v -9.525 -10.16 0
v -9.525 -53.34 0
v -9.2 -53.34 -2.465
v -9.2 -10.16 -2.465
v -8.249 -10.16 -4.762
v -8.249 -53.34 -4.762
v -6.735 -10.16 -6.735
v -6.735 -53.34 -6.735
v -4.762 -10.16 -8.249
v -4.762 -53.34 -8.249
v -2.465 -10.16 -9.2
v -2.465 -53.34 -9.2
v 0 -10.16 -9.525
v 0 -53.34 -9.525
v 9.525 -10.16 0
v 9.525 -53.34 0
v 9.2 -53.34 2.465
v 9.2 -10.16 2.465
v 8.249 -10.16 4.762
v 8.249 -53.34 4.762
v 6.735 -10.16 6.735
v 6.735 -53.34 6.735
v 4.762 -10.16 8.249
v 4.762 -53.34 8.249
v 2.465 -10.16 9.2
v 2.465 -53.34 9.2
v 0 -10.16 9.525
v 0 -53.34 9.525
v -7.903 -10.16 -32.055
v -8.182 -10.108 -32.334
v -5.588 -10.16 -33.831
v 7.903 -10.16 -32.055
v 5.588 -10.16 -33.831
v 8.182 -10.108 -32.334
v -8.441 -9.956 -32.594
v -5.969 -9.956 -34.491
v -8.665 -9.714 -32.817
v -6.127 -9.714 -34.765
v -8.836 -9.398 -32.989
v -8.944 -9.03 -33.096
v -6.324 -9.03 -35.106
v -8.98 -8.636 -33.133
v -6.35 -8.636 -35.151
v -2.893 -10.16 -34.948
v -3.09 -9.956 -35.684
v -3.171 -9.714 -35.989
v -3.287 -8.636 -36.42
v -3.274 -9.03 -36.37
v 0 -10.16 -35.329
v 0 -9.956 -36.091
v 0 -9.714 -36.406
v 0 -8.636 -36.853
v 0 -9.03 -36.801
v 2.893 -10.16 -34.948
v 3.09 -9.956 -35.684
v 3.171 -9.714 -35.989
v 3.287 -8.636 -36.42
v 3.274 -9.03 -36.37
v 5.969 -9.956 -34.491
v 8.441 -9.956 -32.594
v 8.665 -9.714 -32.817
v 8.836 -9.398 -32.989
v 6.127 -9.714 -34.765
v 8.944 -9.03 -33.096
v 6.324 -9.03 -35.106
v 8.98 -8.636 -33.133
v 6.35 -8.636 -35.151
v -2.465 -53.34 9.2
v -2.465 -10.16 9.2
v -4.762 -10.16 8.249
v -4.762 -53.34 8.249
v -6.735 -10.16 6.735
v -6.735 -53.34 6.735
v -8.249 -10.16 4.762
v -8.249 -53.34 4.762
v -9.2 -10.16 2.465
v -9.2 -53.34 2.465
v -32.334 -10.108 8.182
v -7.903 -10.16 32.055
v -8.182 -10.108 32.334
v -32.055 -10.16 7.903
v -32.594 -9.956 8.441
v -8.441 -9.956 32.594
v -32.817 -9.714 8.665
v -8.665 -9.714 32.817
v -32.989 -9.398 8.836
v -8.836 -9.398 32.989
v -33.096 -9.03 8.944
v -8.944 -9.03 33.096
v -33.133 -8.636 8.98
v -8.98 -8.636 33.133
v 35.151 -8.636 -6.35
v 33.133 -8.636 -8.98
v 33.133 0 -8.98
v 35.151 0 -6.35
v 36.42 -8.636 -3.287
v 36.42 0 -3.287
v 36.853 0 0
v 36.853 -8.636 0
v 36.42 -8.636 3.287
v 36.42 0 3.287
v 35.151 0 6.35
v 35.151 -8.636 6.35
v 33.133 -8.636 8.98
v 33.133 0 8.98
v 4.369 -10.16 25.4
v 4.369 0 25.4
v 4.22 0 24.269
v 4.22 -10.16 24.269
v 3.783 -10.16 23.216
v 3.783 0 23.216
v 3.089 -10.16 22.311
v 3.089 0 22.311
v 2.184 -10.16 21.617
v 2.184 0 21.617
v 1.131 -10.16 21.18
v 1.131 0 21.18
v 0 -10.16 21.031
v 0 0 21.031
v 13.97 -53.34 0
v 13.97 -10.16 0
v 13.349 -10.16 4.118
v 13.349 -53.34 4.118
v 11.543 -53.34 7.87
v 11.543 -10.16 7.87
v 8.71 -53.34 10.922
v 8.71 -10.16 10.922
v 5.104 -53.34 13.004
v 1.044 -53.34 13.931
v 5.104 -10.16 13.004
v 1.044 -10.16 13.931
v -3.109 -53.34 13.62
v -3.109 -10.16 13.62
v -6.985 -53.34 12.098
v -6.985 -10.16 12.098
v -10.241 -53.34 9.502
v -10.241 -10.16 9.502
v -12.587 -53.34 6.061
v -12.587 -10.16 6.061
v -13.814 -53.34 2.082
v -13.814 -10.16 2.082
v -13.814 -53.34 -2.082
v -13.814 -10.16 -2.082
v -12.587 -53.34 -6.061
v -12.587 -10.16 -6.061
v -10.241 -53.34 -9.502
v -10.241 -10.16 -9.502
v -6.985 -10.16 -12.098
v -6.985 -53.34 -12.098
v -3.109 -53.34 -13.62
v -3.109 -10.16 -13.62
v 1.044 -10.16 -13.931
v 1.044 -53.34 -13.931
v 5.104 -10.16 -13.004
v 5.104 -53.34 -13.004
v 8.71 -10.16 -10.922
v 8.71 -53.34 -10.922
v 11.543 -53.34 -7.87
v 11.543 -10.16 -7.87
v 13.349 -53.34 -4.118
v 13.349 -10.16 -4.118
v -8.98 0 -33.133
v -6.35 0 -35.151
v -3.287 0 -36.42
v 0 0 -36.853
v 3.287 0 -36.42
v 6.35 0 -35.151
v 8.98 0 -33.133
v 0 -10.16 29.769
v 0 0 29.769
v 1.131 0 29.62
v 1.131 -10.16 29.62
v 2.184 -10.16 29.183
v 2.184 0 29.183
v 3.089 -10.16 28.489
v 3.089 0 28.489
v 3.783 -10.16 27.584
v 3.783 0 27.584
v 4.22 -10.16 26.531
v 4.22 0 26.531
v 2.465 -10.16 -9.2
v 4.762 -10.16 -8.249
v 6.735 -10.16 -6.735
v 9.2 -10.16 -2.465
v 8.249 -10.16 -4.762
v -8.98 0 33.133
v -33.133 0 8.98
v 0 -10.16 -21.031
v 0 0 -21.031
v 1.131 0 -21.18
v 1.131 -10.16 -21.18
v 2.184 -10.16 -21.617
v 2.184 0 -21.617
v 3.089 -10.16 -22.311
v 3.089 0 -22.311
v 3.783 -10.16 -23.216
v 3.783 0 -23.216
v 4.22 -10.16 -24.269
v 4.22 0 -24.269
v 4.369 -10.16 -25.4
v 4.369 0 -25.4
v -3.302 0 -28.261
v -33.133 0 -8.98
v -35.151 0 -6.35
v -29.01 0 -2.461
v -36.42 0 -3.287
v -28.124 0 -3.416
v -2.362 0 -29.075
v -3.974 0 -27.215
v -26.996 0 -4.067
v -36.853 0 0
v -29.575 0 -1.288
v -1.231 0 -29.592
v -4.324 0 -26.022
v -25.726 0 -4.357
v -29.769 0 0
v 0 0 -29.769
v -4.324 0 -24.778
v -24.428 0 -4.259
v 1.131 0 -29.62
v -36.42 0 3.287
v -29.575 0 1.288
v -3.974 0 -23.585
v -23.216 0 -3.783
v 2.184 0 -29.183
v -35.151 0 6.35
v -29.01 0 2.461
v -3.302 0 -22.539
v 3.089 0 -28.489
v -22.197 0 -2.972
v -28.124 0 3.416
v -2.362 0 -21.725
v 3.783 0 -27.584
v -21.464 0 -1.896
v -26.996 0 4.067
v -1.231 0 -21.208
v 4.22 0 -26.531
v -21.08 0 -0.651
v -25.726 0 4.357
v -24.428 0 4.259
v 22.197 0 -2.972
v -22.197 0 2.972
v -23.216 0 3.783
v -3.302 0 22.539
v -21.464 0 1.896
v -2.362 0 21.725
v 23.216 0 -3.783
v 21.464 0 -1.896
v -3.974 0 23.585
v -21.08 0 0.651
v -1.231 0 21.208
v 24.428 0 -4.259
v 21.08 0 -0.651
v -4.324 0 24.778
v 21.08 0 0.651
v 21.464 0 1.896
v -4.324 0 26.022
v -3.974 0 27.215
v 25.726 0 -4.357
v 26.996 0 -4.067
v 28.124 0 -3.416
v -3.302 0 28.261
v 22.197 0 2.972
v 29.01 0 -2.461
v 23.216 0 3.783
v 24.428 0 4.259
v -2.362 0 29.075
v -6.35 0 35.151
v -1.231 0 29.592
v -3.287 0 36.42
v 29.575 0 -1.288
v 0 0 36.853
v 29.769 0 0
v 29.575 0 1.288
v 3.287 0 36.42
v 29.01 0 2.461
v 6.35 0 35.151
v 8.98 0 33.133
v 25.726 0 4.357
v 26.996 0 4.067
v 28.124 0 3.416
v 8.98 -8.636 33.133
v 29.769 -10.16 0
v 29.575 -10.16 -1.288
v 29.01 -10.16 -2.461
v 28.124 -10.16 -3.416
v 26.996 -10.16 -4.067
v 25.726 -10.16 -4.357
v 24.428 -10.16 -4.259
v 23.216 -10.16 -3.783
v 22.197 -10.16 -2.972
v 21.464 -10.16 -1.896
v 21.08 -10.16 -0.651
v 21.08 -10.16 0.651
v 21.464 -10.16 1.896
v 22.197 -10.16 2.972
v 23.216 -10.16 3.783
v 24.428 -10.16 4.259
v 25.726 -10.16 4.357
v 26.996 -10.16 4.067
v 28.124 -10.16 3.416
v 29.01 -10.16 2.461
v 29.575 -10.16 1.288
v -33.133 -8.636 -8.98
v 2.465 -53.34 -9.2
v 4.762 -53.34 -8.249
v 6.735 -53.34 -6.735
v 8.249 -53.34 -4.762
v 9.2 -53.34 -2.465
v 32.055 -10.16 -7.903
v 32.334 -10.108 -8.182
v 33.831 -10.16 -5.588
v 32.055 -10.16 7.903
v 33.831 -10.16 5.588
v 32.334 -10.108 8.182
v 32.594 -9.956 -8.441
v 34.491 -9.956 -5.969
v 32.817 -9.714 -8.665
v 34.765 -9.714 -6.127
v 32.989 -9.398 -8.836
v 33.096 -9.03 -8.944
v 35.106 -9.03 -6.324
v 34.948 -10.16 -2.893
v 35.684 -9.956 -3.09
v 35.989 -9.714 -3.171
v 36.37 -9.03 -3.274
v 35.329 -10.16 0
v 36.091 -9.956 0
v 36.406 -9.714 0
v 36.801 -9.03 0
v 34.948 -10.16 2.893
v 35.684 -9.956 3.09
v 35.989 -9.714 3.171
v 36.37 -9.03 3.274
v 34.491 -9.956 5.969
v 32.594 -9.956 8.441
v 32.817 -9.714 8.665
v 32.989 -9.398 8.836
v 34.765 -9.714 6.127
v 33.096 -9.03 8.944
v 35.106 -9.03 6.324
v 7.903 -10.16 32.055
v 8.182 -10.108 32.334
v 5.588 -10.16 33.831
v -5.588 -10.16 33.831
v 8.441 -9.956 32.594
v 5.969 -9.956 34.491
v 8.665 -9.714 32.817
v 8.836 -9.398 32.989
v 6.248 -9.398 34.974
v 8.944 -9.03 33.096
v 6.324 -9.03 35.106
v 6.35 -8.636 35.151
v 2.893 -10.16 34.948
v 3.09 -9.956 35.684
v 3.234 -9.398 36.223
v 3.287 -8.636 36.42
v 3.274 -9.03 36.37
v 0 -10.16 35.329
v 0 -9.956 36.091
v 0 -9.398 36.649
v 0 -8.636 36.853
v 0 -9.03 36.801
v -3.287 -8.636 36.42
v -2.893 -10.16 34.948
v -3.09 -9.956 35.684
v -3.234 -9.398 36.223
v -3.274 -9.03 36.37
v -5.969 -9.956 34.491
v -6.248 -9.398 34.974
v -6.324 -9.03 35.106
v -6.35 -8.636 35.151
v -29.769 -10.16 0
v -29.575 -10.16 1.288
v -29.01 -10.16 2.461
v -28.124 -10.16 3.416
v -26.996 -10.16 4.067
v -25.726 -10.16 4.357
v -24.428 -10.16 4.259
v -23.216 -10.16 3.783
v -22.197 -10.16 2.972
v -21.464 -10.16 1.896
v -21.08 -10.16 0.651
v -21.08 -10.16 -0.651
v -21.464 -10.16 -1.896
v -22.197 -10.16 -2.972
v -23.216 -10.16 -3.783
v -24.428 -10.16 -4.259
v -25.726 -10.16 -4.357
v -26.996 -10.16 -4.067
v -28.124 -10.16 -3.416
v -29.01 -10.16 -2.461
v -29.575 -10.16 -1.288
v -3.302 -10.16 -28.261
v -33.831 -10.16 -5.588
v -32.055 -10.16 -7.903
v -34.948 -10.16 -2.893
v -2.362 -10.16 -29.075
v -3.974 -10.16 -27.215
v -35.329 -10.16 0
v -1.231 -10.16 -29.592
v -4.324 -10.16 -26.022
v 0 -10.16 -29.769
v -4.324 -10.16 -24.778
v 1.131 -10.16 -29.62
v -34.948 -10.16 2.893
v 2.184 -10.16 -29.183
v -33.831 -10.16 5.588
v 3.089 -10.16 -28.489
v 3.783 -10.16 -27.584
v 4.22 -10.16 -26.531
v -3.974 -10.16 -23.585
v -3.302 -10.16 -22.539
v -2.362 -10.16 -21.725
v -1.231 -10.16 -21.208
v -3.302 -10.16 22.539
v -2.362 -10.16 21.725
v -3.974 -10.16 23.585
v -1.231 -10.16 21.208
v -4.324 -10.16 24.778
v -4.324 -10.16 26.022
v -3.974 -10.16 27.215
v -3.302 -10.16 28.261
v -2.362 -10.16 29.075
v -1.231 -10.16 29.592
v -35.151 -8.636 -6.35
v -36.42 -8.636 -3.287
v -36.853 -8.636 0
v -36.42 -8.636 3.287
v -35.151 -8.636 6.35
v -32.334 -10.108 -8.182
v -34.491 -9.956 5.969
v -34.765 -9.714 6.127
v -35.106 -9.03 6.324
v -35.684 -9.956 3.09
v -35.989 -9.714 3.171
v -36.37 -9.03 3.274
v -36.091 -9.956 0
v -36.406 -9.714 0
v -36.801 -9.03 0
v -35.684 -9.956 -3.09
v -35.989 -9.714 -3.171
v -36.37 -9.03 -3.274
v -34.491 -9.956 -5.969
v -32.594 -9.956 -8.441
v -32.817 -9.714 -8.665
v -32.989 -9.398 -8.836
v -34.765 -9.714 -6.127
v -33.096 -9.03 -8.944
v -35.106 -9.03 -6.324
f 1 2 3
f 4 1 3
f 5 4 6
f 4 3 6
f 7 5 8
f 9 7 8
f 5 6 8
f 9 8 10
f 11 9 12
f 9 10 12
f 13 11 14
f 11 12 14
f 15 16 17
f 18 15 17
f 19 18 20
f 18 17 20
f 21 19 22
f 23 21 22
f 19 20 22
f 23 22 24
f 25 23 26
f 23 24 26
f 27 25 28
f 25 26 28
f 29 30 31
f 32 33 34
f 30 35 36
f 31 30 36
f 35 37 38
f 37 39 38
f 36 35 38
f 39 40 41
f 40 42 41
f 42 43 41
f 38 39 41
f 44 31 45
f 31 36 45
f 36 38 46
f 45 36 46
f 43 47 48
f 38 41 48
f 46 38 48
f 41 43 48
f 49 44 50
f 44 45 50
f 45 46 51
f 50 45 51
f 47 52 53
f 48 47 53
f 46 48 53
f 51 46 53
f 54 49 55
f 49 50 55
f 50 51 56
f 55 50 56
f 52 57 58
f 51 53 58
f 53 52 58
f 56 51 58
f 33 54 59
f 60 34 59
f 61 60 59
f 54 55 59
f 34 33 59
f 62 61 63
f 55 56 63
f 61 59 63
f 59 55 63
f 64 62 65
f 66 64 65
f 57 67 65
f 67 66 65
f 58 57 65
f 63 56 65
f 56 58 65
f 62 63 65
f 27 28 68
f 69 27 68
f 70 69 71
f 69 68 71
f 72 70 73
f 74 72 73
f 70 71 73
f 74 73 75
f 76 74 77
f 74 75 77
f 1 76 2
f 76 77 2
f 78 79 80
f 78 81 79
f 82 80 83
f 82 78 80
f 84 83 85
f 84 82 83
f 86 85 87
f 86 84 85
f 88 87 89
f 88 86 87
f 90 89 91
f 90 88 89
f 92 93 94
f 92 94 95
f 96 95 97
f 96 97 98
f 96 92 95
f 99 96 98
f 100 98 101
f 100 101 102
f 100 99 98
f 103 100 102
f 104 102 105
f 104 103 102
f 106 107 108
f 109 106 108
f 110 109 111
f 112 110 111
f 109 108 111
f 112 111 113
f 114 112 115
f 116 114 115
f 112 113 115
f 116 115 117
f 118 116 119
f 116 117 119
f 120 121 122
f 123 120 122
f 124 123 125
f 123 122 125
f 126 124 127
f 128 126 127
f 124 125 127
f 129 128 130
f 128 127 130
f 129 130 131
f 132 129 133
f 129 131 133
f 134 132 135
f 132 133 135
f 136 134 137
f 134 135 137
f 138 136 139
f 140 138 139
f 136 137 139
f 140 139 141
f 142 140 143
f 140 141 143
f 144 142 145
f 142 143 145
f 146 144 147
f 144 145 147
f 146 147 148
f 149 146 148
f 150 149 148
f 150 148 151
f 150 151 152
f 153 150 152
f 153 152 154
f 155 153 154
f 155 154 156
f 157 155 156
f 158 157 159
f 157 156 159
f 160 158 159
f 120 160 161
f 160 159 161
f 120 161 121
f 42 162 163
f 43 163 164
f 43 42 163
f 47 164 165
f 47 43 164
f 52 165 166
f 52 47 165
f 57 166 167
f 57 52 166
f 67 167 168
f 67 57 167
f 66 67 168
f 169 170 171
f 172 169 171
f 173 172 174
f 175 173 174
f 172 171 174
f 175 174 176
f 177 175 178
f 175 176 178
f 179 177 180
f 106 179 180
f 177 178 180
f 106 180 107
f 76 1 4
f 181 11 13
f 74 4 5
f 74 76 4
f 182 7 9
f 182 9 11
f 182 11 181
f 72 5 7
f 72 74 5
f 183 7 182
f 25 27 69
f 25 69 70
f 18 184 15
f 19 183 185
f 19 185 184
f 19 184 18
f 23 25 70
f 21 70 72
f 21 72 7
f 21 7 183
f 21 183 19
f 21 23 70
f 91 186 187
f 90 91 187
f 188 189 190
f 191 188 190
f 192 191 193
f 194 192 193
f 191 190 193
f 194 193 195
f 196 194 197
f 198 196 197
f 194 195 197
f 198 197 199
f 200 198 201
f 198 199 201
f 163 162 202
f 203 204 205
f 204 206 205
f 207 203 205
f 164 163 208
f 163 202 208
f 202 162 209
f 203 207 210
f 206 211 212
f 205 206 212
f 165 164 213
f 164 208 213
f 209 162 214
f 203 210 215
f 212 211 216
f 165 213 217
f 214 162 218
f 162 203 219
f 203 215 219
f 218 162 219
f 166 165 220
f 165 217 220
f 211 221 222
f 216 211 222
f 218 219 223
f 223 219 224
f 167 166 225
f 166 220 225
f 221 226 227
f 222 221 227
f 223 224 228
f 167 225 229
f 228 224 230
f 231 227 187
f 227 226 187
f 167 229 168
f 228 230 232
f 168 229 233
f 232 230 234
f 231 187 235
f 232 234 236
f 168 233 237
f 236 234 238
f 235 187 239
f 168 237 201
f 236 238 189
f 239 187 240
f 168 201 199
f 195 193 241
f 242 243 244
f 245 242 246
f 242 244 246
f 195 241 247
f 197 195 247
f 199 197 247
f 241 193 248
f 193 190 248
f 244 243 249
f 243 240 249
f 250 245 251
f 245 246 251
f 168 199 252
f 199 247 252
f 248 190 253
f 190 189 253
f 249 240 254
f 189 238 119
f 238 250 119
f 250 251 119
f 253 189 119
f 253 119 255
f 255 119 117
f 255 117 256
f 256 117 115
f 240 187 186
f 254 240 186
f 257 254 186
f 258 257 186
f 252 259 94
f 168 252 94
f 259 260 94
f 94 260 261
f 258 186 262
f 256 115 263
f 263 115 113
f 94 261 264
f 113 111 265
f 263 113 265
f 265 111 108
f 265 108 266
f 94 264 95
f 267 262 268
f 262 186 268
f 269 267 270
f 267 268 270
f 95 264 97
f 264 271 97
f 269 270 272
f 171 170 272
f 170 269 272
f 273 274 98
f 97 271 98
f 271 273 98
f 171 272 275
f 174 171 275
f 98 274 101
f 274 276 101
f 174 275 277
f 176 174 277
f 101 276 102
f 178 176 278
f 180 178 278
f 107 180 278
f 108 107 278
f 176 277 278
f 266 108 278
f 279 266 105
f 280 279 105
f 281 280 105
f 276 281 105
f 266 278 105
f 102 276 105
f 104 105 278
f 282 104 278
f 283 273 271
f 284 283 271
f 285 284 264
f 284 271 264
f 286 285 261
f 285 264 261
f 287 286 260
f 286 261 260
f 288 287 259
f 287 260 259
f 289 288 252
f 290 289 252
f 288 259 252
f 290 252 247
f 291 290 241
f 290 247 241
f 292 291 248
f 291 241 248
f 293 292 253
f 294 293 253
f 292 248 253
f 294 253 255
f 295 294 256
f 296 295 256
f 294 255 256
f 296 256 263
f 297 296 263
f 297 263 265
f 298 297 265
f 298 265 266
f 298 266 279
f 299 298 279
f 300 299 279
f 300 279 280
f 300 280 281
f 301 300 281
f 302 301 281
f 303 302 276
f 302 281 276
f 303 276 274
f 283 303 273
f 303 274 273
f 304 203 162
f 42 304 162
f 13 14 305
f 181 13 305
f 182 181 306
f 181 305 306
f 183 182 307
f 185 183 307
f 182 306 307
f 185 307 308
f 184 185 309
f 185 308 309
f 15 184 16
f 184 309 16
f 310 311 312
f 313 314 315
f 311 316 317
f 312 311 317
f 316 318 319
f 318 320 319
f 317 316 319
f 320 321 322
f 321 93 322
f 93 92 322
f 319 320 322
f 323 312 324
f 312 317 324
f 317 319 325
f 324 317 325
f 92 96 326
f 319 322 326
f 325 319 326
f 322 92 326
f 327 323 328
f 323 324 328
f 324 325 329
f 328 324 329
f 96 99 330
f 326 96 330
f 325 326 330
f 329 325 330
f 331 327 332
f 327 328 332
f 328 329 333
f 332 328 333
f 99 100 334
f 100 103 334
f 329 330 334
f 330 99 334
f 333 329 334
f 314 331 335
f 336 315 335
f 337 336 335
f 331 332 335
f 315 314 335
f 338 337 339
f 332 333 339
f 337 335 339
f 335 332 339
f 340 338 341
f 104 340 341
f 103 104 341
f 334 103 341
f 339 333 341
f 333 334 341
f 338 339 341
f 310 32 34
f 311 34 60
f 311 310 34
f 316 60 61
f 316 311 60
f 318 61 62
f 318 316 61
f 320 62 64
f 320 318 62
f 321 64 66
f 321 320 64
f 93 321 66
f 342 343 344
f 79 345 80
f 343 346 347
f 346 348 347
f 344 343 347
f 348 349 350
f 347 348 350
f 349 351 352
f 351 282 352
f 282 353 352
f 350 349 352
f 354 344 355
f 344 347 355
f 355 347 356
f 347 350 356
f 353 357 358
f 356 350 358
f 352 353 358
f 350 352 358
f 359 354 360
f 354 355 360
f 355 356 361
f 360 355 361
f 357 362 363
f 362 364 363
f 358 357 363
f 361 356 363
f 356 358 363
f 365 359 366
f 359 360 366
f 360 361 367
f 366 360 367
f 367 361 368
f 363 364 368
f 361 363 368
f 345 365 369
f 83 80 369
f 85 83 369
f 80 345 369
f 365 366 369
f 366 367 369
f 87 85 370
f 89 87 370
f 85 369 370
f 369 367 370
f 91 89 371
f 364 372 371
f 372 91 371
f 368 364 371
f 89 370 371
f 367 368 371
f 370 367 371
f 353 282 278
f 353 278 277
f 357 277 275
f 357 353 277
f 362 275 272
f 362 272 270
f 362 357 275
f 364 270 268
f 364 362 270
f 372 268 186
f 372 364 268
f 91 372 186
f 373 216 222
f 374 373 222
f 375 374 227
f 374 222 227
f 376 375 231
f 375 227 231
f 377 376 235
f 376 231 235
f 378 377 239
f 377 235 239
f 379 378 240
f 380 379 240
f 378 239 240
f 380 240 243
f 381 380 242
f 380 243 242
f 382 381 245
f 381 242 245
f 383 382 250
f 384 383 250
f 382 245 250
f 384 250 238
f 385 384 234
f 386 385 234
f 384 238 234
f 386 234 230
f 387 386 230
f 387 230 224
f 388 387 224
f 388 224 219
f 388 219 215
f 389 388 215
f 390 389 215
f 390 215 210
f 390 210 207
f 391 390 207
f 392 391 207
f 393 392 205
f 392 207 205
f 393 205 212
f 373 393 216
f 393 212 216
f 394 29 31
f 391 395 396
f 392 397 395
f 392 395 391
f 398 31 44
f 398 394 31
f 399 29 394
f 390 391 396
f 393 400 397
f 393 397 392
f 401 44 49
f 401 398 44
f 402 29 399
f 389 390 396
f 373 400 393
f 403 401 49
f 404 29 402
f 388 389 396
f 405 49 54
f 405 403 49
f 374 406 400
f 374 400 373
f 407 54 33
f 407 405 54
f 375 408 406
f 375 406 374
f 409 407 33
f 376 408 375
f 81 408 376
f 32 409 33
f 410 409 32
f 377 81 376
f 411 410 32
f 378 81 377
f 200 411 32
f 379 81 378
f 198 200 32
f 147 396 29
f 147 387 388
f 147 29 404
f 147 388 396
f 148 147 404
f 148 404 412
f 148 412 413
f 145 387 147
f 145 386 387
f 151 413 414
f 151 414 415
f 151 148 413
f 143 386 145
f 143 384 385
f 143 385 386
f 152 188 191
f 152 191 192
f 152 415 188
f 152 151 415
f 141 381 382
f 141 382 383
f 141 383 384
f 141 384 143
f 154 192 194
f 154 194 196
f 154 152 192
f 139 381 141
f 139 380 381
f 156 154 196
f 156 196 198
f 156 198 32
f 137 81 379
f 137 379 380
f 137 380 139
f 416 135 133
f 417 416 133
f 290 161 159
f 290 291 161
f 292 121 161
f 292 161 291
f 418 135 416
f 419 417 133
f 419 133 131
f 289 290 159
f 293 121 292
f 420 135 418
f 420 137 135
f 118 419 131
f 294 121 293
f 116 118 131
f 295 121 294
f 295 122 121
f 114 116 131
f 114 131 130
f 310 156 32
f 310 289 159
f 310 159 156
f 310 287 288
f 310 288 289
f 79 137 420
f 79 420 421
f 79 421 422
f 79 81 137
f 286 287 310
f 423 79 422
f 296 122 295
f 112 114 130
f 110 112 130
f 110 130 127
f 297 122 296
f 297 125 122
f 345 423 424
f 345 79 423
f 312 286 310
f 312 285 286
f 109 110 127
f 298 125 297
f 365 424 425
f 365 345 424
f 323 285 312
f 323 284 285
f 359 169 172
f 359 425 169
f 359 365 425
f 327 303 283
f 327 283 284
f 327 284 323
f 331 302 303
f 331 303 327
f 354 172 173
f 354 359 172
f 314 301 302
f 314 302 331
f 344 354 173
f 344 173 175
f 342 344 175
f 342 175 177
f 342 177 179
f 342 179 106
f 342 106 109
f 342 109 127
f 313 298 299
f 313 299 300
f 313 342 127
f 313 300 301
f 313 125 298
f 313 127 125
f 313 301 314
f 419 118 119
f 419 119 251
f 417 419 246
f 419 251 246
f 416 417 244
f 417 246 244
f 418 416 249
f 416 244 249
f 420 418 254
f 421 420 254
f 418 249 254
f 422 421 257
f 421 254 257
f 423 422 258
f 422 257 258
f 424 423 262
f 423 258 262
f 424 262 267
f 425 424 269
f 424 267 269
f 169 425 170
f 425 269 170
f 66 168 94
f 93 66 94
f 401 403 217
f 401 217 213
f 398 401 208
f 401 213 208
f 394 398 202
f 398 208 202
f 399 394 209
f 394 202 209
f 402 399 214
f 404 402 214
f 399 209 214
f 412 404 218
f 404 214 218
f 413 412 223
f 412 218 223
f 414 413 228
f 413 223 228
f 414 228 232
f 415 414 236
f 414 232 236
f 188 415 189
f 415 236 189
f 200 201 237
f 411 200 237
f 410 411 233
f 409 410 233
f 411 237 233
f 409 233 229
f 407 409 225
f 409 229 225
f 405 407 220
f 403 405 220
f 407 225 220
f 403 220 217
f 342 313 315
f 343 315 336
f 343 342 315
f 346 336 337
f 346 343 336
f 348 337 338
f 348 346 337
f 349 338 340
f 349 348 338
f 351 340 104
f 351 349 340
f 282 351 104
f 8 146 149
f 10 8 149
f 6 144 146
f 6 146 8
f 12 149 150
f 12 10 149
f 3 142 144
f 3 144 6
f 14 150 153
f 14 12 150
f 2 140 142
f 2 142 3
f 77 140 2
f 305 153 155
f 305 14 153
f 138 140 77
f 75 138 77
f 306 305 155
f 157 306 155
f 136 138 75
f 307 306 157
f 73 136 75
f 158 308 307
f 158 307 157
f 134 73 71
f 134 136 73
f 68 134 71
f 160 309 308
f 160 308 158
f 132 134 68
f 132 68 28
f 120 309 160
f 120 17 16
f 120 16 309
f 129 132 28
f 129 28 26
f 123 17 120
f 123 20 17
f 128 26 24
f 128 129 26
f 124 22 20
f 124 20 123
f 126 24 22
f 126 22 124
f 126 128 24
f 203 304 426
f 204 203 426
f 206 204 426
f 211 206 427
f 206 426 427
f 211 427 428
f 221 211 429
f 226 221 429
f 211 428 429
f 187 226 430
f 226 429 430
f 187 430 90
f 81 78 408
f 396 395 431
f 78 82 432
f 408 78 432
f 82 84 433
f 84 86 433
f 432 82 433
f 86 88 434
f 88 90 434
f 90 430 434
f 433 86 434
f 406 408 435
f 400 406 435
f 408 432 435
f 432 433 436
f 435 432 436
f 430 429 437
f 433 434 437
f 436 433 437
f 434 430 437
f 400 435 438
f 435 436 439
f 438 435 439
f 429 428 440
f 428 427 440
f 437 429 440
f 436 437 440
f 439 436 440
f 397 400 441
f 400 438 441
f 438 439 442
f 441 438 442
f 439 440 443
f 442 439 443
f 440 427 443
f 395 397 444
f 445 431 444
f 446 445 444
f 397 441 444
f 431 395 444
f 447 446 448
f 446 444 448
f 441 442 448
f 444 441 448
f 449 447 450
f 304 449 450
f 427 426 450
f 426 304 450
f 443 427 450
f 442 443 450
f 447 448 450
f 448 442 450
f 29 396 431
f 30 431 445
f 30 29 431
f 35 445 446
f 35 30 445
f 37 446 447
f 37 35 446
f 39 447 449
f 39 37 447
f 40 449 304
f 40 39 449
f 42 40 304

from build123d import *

# Parameters (mm, degrees)
F1_DEPTH = 10.16
F2_R     = 12.7
F3_R     = 12.7
F4_R     = 1.524
F5_R     = 13.97
F6_DEPTH = 43.18
F8_DEPTH = 43.18


with BuildPart() as f1:
    # F0 (on Front) → F1 (new body)
    with BuildSketch(Plane.XZ):
        with BuildLine():
            Line((0, 21.0312), (0, 0))
            Line((0, 0), (21.0312, 0))
            ThreePointArc((21.0312, 0), (25.4, 4.3688), (29.7688, 0))
            Line((29.7688, 0), (42.1132, 0))
            Line((42.1132, 0), (0, 42.1132))
            Line((0, 42.1132), (0, 29.7688))
            ThreePointArc((0, 29.7688), (3.0892081056, 28.4892081056), (4.3688, 25.4))
            ThreePointArc((4.3688, 25.4), (3.0892081056, 22.3107918944), (0, 21.0312))
        make_face()
        with BuildLine():
            Line((21.0312, 0), (0, 0))
            Line((0, 0), (0, -21.0312))
            ThreePointArc((0, -21.0312), (3.0892081056, -22.3107918944), (4.3688, -25.4))
            ThreePointArc((4.3688, -25.4), (3.0892081056, -28.4892081056), (0, -29.7688))
            Line((0, -29.7688), (0, -42.1132))
            Line((0, -42.1132), (42.1132, 0))
            Line((42.1132, 0), (29.7688, 0))
            ThreePointArc((29.7688, 0), (25.4, -4.3688), (21.0312, 0))
        make_face()
        with BuildLine():
            Line((0, -21.0312), (0, 0))
            Line((0, 0), (-21.0312, 0))
            ThreePointArc((-21.0312, 0), (-25.4, -4.3688), (-29.7688, 0))
            Line((-29.7688, 0), (-42.1132, 0))
            Line((-42.1132, 0), (0, -42.1132))
            Line((0, -42.1132), (0, -29.7688))
            ThreePointArc((0, -29.7688), (-4.3688, -25.4), (0, -21.0312))
        make_face()
        with BuildLine():
            Line((-21.0312, 0), (0, 0))
            Line((0, 0), (0, 21.0312))
            ThreePointArc((0, 21.0312), (-4.3688, 25.4), (0, 29.7688))
            Line((0, 29.7688), (0, 42.1132))
            Line((0, 42.1132), (-42.1132, 0))
            Line((-42.1132, 0), (-29.7688, 0))
            ThreePointArc((-29.7688, 0), (-25.4, 4.3688), (-21.0312, 0))
        make_face()
    extrude(amount=F1_DEPTH)

    # F2
    f2_edges = [f1.edges().sort_by_distance(p)[0] for p in [
        (0, -5.08, 42.1132),
        (-42.1132, -5.08, 0),
    ]]
    fillet(f2_edges, radius=F2_R)

    # F3
    f3_edges = [f1.edges().sort_by_distance(p)[0] for p in [
        (42.1132, -5.08, 0),
        (0, -5.08, -42.1132),
    ]]
    fillet(f3_edges, radius=F3_R)

    # F4
    f4_edges = [f1.edges().sort_by_distance(p)[0] for p in [
        (-21.0566, -10.16, 21.0566),
        (0, -10.16, 36.852688),
        (21.0566, -10.16, 21.0566),
        (36.852688, -10.16, 0),
        (21.0566, -10.16, -21.0566),
        (0, -10.16, -36.852688),
        (-21.0566, -10.16, -21.0566),
        (-36.852688, -10.16, 0),
    ]]
    fillet(f4_edges, radius=F4_R)

    # F5 (on face) → F6 (join)
    with BuildSketch(Plane.XZ.offset(10.16)):
        Circle(F5_R)
    extrude(amount=F6_DEPTH)

    # F7 (on face) → F8 (cut)
    with BuildSketch(Plane.XZ.offset(53.34)):
        with BuildLine():
            Line((0, 0), (9.525, 0))
            ThreePointArc((9.525, 0), (6.7351920908, 6.7351920908), (0, 9.525))
            Line((0, 9.525), (0, 0))
        make_face()
        with BuildLine():
            Line((0, 0), (0, 9.525))
            ThreePointArc((0, 9.525), (-6.7351920908, 6.7351920908), (-9.525, 0))
            Line((-9.525, 0), (0, 0))
        make_face()
        with BuildLine():
            ThreePointArc((-9.525, 0), (-6.7351920908, -6.7351920908), (0, -9.525))
            Line((0, -9.525), (0, 0))
            Line((0, 0), (-9.525, 0))
        make_face()
        with BuildLine():
            ThreePointArc((0, -9.525), (6.7351920908, -6.7351920908), (9.525, 0))
            Line((9.525, 0), (0, 0))
            Line((0, 0), (0, -9.525))
        make_face()
    extrude(amount=-F8_DEPTH, mode=Mode.SUBTRACT)


solid = f1.part
